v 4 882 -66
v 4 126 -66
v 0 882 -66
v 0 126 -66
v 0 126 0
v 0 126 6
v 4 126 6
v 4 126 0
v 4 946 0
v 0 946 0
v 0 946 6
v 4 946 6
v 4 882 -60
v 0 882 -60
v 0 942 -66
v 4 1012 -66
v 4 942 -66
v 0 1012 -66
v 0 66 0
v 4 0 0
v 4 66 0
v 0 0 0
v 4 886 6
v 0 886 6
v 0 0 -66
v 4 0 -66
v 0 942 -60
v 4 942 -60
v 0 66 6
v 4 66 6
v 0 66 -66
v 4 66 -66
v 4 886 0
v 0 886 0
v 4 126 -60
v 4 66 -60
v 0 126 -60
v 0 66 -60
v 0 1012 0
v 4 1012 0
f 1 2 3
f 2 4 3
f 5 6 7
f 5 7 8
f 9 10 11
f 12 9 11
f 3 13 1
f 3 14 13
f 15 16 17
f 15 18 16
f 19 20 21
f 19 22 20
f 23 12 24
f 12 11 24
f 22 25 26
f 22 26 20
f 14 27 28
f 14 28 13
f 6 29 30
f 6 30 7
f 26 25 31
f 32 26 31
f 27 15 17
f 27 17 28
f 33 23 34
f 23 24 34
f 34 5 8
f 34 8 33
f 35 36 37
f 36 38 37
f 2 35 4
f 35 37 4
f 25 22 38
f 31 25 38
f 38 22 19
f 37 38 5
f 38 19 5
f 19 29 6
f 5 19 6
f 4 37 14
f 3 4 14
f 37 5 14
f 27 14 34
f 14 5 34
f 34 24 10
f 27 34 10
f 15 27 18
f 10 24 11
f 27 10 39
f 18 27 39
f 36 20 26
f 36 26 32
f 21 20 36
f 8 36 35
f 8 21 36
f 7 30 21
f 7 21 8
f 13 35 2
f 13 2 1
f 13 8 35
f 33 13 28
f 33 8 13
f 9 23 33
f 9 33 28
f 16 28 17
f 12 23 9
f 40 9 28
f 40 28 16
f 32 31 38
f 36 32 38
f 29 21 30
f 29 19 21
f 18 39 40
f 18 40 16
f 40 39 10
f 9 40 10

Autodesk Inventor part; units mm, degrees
ref_plane "YZ Plane" through (0, 0, 0) normal (1, 0, 0) x (0, 1, 0)
ref_plane "XZ Plane" through (0, 0, 0) normal (0, 1, 0) x (-1, 0, 0)
ref_plane "XY Plane" through (0, 0, 0) normal (0, 0, 1) x (1, 0, 0)
sketch "Esboço1" plane through (0, 0, 0) normal (1, 0, 0) x (0, 1, 0)
  line L0 (1012, 0) -> (1012, -66)
  line L1 (0, -66) -> (0, 0)
  line L2 (1012, 0) -> (946, 0)
  line L3 (946, 0) -> (946, 6)
  line L4 (946, 6) -> (886, 6)
  line L5 (886, 6) -> (886, 0)
  line L6 (0, 0) -> (66, 0)
  line L7 (66, 0) -> (66, 6)
  line L8 (66, 6) -> (126, 6)
  line L9 (126, 6) -> (126, 0)
  line L10 (126, 0) -> (886, 0)
  line L11 (1012, -66) -> (942, -66)
  line L12 (942, -66) -> (942, -60)
  line L13 (942, -60) -> (882, -60)
  line L14 (882, -60) -> (882, -66)
  line L15 (0, -66) -> (66, -66)
  line L16 (66, -66) -> (66, -60)
  line L17 (66, -60) -> (126, -60)
  line L18 (126, -60) -> (126, -66)
  line L19 (126, -66) -> (882, -66)
  dimension "d0" = 1012
  dimension "d1" = 66
  dimension "d4" = 66
  dimension "d5" = 6
  dimension "d6" = 60
  dimension "d7" = 66
  dimension "d8" = 6
  dimension "d9" = 60
  dimension "d10" = 6
  dimension "d11" = 60
  dimension "d12" = 6
  dimension "d13" = 6
  dimension "d16" = 66
  dimension "d17" = 66
extrude "Extrusão1" add sketch "Esboço1" along normal blind 4
sketch "Esboço2" plane through (4, 0, 0) normal (1, 0, 0) x (0, 0, -1)
  point P0 (0, 0)
sketch "Esboço3" plane through (4, 0, 0) normal (1, 0, 0) x (0, 0, -1)
  point P0 (0, 0)
properties part number "PAREDES LAT-CONTRA"
